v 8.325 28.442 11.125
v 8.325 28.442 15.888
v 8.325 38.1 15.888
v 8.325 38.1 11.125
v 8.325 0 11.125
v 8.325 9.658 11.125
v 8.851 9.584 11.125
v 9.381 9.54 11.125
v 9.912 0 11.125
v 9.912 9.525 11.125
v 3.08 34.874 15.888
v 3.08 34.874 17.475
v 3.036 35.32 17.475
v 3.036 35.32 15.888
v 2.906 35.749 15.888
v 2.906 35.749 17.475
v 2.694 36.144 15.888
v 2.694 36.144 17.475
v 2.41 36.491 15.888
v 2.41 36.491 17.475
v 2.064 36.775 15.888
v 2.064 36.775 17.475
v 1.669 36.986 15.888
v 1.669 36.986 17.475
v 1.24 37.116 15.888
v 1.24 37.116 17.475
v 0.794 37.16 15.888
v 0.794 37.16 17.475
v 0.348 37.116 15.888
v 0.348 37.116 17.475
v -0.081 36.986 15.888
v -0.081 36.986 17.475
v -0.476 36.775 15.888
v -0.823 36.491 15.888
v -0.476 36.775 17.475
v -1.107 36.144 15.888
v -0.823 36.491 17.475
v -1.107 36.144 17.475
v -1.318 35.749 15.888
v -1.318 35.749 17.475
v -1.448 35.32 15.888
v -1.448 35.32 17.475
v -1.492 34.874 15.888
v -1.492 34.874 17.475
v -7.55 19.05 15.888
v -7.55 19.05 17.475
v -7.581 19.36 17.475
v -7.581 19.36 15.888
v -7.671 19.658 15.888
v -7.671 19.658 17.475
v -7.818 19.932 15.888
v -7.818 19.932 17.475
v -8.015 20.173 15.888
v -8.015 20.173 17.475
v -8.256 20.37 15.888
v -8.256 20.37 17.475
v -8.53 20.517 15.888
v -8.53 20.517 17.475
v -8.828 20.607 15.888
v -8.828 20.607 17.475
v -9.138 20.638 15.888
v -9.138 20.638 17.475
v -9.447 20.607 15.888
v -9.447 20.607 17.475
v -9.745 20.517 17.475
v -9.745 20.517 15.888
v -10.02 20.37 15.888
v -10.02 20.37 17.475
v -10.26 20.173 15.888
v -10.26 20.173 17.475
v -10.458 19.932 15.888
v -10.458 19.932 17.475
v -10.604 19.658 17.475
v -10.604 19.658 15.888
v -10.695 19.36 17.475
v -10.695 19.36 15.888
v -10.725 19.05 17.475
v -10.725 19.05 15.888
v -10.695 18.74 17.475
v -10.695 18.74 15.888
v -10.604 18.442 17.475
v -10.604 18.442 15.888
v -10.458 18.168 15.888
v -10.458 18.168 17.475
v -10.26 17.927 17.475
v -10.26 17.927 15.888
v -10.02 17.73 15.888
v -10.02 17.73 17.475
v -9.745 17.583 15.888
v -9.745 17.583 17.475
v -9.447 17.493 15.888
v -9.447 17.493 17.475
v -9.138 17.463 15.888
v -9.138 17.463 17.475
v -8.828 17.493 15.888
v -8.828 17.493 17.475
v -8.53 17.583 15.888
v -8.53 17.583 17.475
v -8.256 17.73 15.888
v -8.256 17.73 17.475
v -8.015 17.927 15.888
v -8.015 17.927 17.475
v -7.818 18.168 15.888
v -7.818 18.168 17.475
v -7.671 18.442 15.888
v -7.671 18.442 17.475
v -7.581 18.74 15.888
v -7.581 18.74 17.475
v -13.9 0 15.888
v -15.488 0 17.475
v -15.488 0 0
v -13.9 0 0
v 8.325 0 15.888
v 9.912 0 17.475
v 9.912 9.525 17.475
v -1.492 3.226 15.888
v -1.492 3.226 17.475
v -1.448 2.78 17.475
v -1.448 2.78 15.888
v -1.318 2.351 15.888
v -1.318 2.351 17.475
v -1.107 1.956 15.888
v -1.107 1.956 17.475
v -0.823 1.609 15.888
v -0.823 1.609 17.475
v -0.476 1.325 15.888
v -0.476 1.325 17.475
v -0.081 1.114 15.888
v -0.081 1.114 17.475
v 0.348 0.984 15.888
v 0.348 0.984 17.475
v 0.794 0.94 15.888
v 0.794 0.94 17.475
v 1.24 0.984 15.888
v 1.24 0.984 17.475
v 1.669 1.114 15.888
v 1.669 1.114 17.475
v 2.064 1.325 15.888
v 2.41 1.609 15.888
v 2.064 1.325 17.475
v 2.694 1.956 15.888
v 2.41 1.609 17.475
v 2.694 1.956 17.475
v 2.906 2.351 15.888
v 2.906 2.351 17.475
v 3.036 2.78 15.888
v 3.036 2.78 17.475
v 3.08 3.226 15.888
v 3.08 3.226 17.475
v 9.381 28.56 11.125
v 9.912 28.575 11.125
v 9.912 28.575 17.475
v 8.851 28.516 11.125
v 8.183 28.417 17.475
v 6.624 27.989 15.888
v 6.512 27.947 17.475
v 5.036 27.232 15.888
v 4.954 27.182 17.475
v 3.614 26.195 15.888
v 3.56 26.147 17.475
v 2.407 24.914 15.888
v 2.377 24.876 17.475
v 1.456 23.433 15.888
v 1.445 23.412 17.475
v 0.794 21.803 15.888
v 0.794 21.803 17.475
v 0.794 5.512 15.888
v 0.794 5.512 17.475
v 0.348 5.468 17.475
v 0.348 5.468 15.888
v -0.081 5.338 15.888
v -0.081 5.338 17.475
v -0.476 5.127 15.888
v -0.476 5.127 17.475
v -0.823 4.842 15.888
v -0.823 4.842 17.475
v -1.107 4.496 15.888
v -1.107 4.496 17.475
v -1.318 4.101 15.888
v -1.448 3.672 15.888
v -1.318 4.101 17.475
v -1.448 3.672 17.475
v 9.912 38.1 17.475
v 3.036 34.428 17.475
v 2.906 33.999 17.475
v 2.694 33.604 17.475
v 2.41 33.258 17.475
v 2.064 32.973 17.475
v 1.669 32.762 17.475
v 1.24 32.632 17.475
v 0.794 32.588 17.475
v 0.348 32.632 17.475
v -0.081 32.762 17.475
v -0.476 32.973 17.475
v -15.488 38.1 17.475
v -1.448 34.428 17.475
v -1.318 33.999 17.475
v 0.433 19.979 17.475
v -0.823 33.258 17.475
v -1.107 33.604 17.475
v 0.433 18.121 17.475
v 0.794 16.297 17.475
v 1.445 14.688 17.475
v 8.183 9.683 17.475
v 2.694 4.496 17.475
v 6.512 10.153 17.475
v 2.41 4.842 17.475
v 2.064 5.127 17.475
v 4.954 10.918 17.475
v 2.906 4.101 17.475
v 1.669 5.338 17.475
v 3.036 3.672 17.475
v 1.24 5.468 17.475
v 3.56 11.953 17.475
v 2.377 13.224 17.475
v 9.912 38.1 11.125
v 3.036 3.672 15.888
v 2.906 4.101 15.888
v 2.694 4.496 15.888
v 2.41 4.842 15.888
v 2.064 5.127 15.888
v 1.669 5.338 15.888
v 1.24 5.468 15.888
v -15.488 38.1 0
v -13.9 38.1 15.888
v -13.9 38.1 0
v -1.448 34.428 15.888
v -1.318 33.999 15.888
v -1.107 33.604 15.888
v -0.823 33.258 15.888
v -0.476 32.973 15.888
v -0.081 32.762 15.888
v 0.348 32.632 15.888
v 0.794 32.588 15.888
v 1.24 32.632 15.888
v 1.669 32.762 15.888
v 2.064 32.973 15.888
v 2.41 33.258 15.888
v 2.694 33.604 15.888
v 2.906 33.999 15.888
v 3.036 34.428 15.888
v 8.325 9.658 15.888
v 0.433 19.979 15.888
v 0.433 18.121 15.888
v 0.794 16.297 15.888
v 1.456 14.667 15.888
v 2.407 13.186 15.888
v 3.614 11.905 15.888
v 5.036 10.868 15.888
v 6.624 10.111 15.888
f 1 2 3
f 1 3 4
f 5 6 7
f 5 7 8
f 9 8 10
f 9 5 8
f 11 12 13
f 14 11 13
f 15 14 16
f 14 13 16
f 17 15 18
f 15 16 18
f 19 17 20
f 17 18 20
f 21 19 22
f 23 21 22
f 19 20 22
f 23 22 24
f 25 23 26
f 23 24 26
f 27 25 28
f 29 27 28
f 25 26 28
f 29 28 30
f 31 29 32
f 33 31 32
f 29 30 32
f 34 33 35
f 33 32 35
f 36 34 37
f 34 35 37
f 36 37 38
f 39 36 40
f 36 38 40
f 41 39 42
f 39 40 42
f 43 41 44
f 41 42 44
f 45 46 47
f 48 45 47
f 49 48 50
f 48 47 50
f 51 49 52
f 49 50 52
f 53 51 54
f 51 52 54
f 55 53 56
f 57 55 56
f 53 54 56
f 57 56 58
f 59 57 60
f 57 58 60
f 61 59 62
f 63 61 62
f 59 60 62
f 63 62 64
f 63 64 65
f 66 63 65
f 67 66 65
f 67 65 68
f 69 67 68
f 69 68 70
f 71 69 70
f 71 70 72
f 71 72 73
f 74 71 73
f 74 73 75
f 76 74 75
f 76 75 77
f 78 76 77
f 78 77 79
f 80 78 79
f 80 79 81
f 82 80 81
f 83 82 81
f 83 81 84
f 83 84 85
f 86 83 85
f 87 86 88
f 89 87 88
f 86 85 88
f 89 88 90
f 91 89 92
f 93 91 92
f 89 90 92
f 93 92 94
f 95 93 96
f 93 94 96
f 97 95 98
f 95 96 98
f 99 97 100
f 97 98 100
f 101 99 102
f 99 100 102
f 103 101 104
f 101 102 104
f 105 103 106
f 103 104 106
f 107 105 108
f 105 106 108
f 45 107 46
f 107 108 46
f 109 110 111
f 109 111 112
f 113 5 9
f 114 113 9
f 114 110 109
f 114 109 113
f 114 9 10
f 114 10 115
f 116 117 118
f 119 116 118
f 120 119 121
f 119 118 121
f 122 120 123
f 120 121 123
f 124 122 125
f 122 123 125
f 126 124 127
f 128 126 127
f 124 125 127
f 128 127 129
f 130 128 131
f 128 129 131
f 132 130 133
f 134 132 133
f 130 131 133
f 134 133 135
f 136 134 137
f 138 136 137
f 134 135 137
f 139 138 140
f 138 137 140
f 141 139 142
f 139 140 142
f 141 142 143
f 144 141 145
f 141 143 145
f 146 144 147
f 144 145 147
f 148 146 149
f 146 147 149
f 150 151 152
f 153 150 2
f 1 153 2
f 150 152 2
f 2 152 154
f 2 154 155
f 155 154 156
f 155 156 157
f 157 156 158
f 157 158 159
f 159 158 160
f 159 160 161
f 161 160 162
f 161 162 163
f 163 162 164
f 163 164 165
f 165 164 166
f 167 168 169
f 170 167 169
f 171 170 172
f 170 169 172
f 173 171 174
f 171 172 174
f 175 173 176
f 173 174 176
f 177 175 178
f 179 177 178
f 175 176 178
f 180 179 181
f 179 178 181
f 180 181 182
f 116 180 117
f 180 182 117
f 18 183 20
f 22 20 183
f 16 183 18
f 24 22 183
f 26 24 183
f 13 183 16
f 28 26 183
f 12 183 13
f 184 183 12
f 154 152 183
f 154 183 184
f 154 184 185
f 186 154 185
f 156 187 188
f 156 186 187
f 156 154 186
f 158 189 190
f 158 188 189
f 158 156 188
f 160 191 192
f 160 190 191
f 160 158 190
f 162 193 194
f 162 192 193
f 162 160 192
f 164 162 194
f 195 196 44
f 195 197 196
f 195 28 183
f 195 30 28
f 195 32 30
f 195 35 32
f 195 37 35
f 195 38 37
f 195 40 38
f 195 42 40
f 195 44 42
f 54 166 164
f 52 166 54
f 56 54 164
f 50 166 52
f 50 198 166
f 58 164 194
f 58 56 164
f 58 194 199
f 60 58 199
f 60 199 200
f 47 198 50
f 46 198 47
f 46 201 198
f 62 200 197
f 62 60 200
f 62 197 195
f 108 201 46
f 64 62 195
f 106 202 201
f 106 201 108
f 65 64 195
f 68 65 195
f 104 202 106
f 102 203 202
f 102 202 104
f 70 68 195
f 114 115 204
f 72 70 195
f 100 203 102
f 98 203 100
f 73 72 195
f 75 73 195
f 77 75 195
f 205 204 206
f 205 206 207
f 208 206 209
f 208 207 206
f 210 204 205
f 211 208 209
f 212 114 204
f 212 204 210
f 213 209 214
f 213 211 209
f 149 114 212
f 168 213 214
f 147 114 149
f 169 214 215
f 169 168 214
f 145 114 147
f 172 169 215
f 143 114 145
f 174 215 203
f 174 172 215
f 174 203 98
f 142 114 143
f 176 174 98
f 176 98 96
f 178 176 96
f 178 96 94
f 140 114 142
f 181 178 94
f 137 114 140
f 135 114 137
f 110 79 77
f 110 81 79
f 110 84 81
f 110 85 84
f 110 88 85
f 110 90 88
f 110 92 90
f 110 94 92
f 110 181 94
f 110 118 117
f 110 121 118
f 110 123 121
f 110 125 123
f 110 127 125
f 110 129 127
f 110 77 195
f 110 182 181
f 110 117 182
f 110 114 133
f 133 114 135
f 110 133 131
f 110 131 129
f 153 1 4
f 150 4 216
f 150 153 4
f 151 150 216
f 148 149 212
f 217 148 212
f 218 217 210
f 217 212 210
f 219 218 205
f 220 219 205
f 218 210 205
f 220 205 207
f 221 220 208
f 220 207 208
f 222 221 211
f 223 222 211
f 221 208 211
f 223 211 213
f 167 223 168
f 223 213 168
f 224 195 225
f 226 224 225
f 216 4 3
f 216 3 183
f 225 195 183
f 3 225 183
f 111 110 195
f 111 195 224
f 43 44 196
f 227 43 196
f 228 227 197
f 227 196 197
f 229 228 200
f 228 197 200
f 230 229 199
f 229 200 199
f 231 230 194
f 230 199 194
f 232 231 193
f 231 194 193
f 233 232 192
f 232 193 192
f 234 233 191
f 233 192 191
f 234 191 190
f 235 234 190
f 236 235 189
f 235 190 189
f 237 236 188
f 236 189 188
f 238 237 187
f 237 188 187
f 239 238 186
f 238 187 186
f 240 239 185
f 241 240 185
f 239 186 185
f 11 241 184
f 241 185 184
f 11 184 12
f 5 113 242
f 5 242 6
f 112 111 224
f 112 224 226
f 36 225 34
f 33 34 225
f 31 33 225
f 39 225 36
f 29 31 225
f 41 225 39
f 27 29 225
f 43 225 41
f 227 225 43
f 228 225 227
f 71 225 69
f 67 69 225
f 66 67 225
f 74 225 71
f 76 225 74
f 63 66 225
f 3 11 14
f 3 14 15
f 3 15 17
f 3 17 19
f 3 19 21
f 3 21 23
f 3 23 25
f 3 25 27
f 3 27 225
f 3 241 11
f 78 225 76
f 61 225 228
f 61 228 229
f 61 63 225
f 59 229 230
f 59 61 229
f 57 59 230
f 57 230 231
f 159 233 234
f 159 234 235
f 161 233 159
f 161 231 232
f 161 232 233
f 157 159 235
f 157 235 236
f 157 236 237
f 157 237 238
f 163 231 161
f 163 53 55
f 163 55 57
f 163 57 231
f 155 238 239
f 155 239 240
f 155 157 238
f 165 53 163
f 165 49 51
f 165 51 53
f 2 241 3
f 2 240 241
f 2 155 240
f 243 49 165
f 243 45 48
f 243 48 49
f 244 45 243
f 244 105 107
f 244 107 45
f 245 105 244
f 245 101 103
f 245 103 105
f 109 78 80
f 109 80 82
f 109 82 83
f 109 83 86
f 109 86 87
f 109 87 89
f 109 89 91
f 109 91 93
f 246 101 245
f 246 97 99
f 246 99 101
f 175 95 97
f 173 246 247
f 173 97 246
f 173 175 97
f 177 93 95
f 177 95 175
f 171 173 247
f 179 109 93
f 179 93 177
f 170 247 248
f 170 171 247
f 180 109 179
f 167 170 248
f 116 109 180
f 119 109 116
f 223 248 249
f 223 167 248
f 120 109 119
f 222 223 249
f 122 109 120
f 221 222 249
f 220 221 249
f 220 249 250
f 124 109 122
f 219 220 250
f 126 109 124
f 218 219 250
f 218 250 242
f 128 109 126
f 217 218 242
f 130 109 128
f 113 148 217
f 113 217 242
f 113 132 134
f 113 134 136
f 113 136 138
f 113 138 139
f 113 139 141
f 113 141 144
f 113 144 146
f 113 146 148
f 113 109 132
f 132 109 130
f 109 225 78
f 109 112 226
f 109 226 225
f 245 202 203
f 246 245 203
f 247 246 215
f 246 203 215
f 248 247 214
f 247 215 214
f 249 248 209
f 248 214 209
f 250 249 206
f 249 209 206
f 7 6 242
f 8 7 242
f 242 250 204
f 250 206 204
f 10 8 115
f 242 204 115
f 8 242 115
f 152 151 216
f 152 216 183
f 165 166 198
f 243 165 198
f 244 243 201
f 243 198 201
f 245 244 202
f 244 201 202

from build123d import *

# Parameters (mm, degrees)
F1_DEPTH = 38.1
F2_R     = 1.5875
F3_DEPTH = 17.4762


with BuildPart() as f1:
    # F0 (on Front) → F1 (new body)
    with BuildSketch(Plane.XZ):
        Polygon((9.91235, 17.4752), (-15.48765, 17.4752), (-15.48765, 0), (-13.90015, 0), (-13.90015, 15.8877), (8.32485, 15.8877), (8.32485, 11.1252), (9.91235, 11.1252), align=None)
    extrude(amount=-F1_DEPTH)

    # F2 (on face) → F3 (cut, through all)
    with BuildSketch(Plane.XY.offset(17.4752)):
        with BuildLine():
            Line((-1.49225, 3.2258), (0.79375, 3.2258))
            Line((0.79375, 3.2258), (0.79375, 5.5118))
            ThreePointArc((0.79375, 5.5118), (-0.822696, 4.842246), (-1.49225, 3.2258))
        make_face()
        with BuildLine():
            Line((0.79375, 5.5118), (0.79375, 3.2258))
            Line((0.79375, 3.2258), (3.07975, 3.2258))
            ThreePointArc((3.07975, 3.2258), (2.410196, 4.842246), (0.79375, 5.5118))
        make_face()
        with BuildLine():
            Line((3.07975, 3.2258), (0.79375, 3.2258))
            Line((0.79375, 3.2258), (-1.49225, 3.2258))
            ThreePointArc((-1.49225, 3.2258), (0.79375, 0.9398), (3.07975, 3.2258))
        make_face()
        with BuildLine():
            ThreePointArc((-1.49225, 34.8742), (-0.822696, 33.257754), (0.79375, 32.5882))
            Line((0.79375, 32.5882), (0.79375, 34.8742))
            Line((0.79375, 34.8742), (-1.49225, 34.8742))
        make_face()
        with BuildLine():
            Line((0.79375, 34.8742), (0.79375, 32.5882))
            ThreePointArc((0.79375, 32.5882), (2.410196, 33.257754), (3.07975, 34.8742))
            Line((3.07975, 34.8742), (0.79375, 34.8742))
        make_face()
        with BuildLine():
            ThreePointArc((0.79375, 21.802591), (0.38735, 19.05), (0.79375, 16.297409))
            Line((0.79375, 16.297409), (0.79375, 21.802591))
        make_face()
        with BuildLine():
            Line((0.79375, 21.802591), (0.79375, 16.297409))
            ThreePointArc((0.79375, 16.297409), (11.303565, 9.627148), (19.43735, 19.05))
            ThreePointArc((19.43735, 19.05), (11.303565, 28.472852), (0.79375, 21.802591))
        make_face()
        with BuildLine():
            Line((-1.49225, 34.8742), (0.79375, 34.8742))
            Line((0.79375, 34.8742), (3.07975, 34.8742))
            ThreePointArc((3.07975, 34.8742), (0.79375, 37.1602), (-1.49225, 34.8742))
        make_face()
        with Locations((-9.13765, 19.05)):
            Circle(F2_R)
    extrude(amount=-F3_DEPTH, mode=Mode.SUBTRACT)


solid = f1.part
